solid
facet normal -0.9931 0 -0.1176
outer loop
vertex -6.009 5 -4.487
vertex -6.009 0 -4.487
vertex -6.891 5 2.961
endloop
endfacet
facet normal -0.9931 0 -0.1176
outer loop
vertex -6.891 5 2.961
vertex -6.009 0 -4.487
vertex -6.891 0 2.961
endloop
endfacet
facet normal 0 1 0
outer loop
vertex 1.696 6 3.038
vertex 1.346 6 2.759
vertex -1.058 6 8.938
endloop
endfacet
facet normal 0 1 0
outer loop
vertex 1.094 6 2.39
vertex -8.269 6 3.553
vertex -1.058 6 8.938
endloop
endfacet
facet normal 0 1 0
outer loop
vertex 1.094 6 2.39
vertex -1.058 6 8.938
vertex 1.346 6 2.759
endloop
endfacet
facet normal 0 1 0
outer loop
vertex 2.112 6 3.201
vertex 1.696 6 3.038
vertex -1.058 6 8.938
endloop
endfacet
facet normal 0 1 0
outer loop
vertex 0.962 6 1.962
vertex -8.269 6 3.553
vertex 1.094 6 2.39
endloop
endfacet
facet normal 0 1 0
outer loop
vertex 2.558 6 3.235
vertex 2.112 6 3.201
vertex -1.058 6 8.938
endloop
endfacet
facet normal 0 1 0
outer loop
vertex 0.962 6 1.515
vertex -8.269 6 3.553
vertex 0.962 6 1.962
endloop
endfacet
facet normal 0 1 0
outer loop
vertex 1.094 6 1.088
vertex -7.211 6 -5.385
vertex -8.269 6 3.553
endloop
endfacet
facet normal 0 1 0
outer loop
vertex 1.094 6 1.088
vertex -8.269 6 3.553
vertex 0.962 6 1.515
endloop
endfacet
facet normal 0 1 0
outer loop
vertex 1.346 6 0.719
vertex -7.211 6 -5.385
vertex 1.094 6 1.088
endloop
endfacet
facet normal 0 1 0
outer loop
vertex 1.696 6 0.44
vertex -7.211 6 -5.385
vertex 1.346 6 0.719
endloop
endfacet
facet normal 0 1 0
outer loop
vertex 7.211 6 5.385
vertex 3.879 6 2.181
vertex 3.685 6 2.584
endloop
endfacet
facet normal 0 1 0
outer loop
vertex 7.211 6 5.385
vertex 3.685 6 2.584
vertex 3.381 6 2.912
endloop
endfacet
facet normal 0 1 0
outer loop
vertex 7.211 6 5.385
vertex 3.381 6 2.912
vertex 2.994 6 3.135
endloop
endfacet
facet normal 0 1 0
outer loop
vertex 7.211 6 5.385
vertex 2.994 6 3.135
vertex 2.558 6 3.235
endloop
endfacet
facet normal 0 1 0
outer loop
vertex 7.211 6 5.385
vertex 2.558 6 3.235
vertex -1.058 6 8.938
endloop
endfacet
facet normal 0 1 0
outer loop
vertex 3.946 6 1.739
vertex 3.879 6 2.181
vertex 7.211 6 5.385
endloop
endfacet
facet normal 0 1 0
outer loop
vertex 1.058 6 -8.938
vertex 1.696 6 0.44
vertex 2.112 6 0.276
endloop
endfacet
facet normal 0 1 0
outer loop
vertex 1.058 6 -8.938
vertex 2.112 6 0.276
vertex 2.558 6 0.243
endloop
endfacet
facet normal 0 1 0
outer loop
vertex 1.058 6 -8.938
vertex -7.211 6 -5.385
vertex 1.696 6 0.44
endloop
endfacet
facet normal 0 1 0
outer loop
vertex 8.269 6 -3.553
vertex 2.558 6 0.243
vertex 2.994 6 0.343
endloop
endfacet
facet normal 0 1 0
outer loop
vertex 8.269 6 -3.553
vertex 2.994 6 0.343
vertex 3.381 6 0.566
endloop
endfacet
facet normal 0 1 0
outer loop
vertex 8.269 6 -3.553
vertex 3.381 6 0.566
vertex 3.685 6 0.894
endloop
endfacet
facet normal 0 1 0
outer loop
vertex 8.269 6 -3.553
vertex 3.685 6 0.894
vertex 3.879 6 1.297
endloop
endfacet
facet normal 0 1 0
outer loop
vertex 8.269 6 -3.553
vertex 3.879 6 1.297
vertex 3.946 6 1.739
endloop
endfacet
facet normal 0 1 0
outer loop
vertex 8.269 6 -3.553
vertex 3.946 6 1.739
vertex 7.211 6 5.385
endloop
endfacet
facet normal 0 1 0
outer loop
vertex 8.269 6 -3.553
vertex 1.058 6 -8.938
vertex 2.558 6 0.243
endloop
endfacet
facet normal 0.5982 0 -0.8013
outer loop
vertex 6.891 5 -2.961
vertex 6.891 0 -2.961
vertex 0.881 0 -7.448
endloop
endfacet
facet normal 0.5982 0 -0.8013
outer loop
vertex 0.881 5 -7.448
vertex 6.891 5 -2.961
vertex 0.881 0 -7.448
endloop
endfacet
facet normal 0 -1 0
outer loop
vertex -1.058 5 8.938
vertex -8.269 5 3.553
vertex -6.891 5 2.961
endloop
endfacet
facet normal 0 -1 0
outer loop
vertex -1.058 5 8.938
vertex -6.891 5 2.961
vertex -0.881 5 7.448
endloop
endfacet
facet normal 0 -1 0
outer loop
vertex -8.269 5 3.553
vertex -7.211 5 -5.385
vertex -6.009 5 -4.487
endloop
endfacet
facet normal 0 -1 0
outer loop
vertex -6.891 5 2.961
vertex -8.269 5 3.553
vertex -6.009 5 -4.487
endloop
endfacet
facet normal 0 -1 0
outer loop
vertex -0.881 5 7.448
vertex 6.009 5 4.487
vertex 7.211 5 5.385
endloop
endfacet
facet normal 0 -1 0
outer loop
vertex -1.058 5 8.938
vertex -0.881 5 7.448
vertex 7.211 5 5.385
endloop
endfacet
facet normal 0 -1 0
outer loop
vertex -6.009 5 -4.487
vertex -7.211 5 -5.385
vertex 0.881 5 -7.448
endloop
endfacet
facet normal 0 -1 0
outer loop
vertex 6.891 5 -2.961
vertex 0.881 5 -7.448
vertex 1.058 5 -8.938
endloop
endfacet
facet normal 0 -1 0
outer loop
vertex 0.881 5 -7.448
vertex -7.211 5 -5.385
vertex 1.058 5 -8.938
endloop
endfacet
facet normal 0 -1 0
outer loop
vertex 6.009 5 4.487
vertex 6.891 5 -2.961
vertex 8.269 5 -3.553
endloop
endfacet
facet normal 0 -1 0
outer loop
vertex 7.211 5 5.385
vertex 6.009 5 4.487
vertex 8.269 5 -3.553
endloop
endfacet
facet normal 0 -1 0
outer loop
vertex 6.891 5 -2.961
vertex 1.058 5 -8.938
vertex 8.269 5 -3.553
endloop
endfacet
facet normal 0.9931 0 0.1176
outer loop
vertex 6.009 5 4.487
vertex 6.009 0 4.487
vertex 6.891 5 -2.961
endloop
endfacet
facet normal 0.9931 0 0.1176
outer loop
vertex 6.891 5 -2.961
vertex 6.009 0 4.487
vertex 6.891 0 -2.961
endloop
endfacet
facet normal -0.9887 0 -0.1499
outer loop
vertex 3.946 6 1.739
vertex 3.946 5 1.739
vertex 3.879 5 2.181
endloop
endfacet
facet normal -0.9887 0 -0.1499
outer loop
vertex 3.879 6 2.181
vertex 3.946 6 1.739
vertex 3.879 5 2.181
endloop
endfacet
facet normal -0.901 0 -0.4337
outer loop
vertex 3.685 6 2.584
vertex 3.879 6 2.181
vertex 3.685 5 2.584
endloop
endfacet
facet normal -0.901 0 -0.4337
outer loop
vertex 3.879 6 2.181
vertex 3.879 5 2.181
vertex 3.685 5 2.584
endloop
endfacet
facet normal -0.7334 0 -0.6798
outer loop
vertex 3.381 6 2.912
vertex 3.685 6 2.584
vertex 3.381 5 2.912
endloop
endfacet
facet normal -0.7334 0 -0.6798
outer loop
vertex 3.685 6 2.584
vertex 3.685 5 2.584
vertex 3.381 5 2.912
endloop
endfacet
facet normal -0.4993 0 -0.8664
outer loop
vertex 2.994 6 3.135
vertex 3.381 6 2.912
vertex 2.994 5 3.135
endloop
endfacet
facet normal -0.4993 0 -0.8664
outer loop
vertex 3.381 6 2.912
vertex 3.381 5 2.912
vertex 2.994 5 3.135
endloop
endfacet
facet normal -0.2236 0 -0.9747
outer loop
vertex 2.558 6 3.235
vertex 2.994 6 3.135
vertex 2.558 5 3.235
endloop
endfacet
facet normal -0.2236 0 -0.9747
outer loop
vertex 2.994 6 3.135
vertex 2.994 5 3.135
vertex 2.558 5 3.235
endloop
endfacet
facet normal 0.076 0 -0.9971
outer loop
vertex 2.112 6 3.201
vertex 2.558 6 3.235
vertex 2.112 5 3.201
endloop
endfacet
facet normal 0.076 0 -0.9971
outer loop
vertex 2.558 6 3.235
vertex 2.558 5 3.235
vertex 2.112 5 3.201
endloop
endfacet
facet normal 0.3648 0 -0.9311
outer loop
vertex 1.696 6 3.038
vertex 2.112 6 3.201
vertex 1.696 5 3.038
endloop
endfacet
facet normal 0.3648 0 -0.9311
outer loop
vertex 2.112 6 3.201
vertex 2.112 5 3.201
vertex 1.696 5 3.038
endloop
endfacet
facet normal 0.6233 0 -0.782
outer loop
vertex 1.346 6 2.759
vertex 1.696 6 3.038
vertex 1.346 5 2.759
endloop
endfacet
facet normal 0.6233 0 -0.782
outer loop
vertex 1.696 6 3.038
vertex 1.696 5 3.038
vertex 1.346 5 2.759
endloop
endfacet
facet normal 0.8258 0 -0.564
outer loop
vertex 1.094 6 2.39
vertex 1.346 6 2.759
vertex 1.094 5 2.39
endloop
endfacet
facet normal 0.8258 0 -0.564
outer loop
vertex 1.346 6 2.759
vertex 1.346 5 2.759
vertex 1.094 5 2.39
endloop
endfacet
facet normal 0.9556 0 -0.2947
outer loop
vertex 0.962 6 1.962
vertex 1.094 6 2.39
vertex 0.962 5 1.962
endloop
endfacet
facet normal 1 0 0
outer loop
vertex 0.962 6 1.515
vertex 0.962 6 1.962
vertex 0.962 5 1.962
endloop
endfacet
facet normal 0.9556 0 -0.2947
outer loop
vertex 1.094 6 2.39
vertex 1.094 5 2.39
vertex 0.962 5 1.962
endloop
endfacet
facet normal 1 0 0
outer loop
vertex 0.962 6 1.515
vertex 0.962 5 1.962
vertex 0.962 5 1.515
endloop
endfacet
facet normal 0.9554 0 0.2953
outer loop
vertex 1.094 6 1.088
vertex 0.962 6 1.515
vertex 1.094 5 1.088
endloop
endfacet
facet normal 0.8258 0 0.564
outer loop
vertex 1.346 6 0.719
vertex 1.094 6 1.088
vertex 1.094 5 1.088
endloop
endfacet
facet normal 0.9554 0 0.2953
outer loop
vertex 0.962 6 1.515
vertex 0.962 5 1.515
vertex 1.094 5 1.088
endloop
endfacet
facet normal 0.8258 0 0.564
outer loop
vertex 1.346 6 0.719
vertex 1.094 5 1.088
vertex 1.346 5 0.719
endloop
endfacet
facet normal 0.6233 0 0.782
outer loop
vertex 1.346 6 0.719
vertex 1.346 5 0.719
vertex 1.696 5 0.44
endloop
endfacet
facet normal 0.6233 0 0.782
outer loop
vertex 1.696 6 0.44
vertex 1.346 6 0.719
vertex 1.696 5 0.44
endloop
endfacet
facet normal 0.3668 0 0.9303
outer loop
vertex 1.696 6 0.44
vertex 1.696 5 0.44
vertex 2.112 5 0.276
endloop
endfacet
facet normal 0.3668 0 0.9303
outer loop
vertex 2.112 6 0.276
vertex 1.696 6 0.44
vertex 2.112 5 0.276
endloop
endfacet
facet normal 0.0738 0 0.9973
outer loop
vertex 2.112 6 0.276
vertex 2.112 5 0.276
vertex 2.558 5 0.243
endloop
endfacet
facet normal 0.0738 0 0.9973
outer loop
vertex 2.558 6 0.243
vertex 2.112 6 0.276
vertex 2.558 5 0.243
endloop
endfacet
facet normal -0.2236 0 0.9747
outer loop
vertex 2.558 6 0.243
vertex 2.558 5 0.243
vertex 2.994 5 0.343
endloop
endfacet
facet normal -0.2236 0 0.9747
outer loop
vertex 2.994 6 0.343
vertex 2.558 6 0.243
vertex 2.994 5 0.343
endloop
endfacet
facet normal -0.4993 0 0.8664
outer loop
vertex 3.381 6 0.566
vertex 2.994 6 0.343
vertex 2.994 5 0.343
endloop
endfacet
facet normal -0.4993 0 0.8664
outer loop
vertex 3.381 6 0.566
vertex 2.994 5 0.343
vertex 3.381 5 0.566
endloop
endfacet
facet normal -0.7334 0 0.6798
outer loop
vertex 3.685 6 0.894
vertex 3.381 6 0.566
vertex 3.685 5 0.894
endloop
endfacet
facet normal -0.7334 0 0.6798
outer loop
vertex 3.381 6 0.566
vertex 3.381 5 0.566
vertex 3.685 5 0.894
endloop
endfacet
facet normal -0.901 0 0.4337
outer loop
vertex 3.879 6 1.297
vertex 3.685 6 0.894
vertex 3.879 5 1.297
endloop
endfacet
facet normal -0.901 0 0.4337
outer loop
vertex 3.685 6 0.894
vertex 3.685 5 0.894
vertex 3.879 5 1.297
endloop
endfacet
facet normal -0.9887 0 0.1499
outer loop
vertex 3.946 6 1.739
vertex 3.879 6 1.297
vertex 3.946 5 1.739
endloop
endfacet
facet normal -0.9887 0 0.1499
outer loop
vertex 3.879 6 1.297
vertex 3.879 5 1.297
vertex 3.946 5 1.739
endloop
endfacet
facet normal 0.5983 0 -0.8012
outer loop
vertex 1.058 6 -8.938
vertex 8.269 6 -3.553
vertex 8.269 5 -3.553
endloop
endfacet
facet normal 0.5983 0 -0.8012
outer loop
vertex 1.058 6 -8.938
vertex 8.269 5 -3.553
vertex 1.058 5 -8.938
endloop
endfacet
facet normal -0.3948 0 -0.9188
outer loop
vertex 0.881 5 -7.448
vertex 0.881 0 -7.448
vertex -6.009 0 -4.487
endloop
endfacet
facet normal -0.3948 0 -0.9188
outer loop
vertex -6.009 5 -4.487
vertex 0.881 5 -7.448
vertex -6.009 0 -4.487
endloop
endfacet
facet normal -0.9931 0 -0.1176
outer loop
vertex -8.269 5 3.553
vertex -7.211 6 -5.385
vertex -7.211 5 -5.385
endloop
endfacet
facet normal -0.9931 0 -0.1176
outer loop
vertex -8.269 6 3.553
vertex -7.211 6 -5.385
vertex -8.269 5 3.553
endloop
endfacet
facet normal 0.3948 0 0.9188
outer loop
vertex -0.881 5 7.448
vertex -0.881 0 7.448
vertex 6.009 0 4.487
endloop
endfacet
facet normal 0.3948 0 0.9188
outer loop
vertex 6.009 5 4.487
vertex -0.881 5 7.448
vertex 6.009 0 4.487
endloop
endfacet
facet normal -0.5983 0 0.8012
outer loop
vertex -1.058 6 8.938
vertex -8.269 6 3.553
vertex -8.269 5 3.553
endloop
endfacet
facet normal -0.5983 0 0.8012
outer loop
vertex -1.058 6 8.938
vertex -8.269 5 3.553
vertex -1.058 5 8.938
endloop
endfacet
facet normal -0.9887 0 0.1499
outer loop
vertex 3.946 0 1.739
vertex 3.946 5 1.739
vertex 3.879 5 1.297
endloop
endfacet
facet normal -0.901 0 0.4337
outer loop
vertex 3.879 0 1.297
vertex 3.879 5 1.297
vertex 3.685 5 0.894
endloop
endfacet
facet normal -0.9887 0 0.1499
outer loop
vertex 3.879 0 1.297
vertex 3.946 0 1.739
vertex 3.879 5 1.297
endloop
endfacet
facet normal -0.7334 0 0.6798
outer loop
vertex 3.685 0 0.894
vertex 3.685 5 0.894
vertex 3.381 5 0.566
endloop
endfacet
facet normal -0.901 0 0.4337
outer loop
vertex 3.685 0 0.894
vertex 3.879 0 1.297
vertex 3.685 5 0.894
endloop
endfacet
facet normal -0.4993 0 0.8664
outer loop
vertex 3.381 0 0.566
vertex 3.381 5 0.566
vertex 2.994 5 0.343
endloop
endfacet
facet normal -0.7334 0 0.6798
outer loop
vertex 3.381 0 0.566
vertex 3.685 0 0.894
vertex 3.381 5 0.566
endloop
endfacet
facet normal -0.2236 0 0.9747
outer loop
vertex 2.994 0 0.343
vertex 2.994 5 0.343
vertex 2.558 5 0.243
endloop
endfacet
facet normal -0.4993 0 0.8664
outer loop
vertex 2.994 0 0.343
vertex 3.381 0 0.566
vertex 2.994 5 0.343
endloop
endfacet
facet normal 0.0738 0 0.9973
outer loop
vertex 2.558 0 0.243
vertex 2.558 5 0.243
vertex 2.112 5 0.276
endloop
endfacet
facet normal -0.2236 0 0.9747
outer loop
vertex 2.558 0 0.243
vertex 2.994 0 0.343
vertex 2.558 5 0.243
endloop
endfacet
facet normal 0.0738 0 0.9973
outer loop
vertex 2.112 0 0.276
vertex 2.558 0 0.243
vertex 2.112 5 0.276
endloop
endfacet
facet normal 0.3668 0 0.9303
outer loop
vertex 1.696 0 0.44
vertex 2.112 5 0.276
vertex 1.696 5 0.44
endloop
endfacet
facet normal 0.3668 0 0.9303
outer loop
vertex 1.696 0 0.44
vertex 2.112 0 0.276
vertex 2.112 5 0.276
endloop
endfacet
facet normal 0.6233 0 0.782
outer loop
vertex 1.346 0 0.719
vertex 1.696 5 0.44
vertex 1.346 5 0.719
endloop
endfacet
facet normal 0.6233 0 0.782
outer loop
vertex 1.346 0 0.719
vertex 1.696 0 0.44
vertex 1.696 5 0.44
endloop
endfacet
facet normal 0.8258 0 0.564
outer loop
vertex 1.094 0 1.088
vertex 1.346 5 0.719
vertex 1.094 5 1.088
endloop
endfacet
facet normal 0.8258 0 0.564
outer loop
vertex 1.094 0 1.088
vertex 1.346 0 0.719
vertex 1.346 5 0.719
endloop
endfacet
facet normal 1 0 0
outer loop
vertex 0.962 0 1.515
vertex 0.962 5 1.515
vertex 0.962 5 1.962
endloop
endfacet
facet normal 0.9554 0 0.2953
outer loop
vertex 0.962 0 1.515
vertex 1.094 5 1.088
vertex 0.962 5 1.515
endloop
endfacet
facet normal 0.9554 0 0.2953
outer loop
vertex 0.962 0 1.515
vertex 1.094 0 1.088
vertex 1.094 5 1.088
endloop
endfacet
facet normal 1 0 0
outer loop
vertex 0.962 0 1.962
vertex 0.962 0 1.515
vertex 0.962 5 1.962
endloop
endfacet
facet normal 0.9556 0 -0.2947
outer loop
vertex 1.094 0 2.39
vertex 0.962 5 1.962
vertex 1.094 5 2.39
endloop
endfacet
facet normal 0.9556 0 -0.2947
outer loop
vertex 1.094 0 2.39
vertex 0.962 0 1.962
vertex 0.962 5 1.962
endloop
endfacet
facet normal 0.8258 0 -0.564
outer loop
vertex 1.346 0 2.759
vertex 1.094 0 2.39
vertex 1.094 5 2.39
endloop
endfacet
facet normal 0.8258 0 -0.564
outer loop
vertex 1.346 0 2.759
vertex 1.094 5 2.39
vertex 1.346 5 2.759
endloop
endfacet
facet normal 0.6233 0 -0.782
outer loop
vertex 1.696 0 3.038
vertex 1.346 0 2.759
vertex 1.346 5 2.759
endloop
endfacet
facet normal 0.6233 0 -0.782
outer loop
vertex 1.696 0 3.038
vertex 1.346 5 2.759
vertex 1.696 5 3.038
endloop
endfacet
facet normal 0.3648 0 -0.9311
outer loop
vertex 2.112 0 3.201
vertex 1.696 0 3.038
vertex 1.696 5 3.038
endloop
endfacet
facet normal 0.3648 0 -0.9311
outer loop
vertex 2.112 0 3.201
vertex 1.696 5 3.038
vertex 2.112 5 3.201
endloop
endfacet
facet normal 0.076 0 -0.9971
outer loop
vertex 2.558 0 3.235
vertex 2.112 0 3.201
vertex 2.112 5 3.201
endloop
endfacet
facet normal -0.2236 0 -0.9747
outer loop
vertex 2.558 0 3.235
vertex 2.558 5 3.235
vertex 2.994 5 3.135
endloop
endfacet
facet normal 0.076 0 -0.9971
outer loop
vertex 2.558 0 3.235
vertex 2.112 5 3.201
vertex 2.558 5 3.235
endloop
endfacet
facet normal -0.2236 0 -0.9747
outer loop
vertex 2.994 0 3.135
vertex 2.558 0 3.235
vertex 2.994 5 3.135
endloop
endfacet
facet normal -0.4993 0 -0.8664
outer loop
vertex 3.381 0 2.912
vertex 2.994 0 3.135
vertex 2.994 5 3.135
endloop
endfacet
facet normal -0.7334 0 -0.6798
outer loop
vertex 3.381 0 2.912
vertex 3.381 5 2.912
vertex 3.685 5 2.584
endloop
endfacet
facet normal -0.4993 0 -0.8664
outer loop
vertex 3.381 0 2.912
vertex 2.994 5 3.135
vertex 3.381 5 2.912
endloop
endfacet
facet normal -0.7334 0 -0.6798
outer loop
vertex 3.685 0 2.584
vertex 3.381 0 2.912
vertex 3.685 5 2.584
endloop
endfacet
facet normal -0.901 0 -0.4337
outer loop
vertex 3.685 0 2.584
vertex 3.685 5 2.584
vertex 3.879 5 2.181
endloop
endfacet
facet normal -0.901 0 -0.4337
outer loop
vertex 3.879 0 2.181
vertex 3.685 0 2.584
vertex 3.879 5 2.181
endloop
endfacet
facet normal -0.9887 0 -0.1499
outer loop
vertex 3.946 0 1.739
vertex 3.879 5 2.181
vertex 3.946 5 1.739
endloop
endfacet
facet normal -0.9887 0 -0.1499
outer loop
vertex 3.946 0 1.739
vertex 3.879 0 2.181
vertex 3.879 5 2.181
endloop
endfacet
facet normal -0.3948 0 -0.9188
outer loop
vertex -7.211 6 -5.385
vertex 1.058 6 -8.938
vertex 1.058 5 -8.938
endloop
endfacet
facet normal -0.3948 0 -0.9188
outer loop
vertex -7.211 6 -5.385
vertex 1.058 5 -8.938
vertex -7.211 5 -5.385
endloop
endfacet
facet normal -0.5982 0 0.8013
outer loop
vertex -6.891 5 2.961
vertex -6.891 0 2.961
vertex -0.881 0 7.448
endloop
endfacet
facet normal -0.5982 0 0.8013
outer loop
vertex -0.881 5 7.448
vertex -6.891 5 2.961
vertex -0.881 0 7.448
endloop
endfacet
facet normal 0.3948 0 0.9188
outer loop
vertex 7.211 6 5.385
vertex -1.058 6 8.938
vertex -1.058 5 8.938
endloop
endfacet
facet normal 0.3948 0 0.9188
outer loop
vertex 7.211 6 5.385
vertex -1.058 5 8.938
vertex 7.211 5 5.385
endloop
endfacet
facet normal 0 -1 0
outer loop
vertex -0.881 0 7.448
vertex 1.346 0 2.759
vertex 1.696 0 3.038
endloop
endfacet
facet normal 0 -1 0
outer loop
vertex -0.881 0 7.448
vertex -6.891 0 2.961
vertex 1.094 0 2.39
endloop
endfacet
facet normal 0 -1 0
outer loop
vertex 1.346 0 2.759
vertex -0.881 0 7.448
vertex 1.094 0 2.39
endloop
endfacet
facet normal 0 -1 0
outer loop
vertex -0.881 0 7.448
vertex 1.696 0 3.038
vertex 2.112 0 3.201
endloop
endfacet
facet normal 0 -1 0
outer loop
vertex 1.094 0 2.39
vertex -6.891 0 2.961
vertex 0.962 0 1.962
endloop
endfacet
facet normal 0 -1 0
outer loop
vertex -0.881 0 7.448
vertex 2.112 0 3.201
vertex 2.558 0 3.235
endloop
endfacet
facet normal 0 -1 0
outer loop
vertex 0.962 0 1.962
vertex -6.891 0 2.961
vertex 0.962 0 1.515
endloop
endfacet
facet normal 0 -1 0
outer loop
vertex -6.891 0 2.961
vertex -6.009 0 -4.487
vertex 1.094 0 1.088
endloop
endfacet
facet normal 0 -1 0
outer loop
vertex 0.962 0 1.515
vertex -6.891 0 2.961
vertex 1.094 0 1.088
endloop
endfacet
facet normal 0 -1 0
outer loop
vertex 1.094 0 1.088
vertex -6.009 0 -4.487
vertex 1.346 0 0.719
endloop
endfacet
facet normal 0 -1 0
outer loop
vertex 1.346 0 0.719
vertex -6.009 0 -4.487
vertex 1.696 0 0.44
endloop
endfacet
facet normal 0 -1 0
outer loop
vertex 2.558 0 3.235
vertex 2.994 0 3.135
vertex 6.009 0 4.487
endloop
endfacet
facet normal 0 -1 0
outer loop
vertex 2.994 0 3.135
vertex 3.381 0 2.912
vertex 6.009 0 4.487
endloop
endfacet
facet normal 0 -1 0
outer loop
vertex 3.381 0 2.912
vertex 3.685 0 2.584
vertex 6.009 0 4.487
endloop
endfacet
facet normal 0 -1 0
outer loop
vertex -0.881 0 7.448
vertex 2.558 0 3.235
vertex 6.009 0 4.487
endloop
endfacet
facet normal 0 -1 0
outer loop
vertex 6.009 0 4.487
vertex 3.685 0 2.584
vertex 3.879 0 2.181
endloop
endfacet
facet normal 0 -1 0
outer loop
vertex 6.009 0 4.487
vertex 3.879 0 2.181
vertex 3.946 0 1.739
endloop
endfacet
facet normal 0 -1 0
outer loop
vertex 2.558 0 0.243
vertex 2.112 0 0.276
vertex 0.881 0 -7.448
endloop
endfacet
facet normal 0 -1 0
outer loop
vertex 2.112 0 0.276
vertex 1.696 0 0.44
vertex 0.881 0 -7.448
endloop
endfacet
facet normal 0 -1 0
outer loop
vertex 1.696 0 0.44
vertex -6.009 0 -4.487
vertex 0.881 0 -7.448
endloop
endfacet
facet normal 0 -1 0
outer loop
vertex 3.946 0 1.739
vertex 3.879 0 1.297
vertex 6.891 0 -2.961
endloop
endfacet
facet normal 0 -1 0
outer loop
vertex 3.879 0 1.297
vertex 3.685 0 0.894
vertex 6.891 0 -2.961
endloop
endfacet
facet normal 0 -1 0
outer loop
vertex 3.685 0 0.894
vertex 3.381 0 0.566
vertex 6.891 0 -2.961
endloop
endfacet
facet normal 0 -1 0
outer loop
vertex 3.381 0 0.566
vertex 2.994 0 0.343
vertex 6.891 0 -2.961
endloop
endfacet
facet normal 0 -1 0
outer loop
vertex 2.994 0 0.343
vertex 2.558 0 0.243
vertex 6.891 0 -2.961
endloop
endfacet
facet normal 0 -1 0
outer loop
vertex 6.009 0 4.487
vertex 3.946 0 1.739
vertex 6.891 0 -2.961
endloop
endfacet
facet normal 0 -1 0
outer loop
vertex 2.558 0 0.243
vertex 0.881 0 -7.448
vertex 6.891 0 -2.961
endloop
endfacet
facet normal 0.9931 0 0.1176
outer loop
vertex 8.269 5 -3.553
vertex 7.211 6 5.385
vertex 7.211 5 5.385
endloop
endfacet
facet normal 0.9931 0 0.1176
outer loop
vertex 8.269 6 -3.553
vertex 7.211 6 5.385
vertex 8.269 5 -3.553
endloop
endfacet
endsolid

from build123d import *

# Parameters (mm, degrees)
SKETCH1_R           = 1.5
BOSS_EXTRUDE1_DEPTH = 6
BOSS_EXTRUDE2_DEPTH = 1
SKETCH4_R           = 1.5
CUT_EXTRUDE1_DEPTH  = 1


with BuildPart() as part:
    # Sketch1 → Boss-Extrude1 (new body)
    with BuildSketch(Plane(origin=(0, 0, 0), x_dir=(1, 0, 0), z_dir=(0, 1, 0))):
        Polygon((-6.890880132, -2.960704478), (-0.881394775, -7.448029488), (6.009485357, -4.48732501), (6.890880132, 2.960704478), (0.881394775, 7.448029488), (-6.009485357, 4.48732501), align=None)
        with Locations((2.445675843, -1.738841474)):
            Circle(SKETCH1_R, mode=Mode.SUBTRACT)
    extrude(amount=BOSS_EXTRUDE1_DEPTH)

    # Sketch2 → Boss-Extrude2 (add)
    with BuildSketch(Plane(origin=(0, 6, 0), x_dir=(1, 0, 0), z_dir=(0, 1, 0))):
        Polygon((8.269056159, 3.552845373), (1.05767373, 8.937635385), (-7.211382428, 5.384790012), (-8.269056159, -3.552845373), (-1.05767373, -8.937635385), (7.211382428, -5.384790012), align=None)
    extrude(amount=-BOSS_EXTRUDE2_DEPTH)

    # Sketch4 → Cut-Extrude1 (cut)
    with BuildSketch(Plane.XZ.offset(-5)):
        with Locations((2.445675843, 1.738841474)):
            Circle(SKETCH4_R)
    extrude(amount=-CUT_EXTRUDE1_DEPTH, mode=Mode.SUBTRACT)


solid = part.part
